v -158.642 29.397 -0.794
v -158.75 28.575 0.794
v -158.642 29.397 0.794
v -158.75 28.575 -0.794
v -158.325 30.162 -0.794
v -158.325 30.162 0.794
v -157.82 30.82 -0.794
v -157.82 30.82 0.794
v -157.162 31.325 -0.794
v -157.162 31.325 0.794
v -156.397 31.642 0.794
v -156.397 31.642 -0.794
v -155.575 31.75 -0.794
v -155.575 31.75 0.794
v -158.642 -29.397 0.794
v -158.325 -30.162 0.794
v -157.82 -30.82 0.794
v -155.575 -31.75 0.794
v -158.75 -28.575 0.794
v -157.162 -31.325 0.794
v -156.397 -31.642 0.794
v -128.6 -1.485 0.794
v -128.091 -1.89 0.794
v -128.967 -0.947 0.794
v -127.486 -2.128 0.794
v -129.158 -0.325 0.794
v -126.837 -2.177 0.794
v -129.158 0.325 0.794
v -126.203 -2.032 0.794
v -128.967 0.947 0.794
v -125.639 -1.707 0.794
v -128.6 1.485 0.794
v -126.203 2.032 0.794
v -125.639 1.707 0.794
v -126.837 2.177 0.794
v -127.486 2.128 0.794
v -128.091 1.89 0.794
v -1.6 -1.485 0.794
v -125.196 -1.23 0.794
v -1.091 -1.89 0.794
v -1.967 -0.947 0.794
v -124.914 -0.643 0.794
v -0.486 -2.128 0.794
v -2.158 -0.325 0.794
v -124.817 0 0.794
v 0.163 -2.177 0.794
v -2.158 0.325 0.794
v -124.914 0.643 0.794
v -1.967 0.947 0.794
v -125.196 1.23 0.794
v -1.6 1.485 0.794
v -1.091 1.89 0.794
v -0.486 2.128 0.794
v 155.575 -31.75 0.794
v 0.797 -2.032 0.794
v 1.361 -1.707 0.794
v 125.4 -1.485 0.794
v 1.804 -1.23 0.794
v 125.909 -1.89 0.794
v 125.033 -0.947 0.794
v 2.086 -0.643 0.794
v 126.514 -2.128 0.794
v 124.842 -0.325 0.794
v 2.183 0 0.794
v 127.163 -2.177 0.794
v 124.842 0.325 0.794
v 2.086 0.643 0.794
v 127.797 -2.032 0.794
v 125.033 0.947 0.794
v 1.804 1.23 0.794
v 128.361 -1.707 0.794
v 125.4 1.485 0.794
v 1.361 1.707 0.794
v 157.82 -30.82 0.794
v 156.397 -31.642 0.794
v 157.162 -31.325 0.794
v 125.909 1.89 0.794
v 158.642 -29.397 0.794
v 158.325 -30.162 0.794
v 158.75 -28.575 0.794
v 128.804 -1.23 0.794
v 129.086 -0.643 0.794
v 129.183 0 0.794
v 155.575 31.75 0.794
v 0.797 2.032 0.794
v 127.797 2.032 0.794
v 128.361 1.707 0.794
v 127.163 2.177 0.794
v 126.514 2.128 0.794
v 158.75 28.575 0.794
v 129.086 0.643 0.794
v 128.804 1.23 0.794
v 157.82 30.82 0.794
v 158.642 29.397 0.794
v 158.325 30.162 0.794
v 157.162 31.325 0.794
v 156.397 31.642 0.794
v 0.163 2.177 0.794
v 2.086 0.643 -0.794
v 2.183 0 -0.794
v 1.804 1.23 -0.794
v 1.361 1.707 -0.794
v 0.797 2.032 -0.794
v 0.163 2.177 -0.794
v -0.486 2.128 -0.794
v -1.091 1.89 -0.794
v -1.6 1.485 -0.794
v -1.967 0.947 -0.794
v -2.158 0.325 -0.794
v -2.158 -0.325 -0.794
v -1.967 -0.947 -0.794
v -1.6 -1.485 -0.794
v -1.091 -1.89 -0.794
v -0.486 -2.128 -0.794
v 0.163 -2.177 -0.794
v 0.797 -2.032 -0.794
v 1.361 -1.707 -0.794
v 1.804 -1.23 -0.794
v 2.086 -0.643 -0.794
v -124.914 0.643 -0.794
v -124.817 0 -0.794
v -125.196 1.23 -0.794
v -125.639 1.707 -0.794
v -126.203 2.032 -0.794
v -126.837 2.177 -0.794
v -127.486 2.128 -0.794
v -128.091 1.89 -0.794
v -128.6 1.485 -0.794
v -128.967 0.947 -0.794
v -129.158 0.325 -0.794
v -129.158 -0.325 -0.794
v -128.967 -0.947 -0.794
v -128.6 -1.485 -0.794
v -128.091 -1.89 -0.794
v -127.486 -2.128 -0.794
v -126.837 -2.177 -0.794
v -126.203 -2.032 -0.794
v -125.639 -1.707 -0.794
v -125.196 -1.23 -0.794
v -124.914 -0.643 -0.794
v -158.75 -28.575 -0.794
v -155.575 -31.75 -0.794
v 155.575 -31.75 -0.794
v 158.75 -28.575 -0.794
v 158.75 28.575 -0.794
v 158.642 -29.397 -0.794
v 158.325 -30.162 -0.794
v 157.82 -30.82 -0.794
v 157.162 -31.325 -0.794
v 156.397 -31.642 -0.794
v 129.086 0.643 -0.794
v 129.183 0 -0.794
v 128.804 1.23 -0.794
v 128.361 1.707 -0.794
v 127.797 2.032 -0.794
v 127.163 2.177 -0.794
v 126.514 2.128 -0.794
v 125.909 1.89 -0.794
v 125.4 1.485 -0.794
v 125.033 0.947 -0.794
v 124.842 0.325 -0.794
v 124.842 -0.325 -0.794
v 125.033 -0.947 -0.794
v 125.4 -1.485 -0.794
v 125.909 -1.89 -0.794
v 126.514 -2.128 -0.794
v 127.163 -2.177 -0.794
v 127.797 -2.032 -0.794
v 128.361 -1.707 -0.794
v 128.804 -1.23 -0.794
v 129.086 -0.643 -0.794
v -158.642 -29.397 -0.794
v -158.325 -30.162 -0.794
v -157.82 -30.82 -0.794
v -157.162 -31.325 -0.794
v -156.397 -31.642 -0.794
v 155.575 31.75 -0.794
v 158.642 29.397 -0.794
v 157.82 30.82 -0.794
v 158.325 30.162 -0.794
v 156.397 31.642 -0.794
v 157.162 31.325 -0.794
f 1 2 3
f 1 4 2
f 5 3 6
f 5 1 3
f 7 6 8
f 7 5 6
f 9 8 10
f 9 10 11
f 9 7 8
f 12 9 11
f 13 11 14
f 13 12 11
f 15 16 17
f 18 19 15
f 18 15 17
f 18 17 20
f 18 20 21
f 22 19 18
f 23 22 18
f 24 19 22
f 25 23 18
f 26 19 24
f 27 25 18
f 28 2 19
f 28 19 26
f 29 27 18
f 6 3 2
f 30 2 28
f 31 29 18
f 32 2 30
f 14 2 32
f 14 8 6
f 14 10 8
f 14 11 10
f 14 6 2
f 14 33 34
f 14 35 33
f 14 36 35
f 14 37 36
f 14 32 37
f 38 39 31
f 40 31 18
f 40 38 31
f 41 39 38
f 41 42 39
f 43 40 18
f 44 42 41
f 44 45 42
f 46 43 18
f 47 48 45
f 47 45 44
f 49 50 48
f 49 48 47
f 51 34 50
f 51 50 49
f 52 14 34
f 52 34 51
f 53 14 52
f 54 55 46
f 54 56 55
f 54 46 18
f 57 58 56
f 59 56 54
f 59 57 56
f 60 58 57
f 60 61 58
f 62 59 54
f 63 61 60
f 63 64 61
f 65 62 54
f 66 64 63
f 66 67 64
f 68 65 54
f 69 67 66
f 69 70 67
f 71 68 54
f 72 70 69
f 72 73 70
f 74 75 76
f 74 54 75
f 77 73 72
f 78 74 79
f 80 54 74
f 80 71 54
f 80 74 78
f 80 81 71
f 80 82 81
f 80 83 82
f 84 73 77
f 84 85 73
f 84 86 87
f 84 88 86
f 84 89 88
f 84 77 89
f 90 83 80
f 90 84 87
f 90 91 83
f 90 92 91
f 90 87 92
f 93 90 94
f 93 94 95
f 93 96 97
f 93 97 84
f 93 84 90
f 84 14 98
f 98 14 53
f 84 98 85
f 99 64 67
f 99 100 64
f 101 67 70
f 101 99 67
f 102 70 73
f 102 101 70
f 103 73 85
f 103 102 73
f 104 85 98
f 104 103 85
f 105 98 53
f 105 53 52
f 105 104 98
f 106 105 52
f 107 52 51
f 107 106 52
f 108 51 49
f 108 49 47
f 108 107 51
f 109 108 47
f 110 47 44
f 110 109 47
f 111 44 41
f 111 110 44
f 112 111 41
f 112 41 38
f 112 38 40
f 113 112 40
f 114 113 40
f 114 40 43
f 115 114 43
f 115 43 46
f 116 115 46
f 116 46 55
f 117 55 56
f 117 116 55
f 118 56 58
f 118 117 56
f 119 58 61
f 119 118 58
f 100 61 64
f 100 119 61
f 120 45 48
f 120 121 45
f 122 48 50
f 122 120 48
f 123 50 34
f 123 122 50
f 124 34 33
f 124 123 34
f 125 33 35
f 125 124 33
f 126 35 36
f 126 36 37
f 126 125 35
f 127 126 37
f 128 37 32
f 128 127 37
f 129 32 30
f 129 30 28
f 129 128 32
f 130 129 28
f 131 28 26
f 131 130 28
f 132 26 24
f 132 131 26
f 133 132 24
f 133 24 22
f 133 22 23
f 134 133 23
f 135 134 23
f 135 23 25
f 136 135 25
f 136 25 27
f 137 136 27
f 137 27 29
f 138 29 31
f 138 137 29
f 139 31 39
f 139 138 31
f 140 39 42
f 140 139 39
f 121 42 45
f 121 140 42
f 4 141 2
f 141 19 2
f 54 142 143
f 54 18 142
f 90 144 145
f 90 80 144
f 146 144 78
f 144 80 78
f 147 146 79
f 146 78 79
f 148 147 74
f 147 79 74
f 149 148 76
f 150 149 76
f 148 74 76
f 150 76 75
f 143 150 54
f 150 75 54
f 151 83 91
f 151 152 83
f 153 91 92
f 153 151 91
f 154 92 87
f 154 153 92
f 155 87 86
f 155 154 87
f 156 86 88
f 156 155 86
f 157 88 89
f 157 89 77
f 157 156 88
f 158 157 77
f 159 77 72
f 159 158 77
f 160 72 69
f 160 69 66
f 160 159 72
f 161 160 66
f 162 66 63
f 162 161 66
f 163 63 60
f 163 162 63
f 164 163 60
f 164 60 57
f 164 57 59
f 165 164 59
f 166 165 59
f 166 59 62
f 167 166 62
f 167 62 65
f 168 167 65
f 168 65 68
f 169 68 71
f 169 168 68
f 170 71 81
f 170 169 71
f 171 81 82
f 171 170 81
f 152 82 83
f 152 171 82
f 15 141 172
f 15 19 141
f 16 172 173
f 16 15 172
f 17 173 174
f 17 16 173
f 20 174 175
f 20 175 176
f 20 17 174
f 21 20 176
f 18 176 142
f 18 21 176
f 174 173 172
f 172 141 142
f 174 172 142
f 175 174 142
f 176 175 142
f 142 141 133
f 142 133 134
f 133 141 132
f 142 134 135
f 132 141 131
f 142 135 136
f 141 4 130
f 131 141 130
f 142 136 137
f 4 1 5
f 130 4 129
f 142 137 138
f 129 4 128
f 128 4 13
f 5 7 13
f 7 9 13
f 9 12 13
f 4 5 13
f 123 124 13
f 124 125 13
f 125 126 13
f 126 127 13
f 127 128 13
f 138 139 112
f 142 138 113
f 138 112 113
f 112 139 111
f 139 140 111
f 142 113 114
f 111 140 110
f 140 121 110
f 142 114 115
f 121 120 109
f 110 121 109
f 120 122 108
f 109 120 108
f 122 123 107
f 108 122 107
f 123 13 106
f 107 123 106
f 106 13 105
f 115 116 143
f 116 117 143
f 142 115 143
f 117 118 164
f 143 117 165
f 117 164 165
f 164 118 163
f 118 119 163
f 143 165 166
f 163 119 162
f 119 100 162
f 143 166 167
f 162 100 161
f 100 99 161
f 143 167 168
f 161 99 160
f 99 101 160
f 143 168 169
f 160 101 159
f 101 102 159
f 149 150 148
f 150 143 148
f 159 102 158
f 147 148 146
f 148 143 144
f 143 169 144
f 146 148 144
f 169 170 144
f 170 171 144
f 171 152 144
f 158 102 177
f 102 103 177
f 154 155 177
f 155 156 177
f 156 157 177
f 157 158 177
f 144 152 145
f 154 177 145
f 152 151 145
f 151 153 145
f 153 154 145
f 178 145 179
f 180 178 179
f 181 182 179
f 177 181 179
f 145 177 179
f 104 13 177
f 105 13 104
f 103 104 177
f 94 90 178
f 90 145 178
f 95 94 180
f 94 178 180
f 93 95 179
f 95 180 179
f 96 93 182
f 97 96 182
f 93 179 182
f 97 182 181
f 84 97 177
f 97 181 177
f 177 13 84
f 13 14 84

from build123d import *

# Parameters (mm, degrees)
SKETCH1_W           = 317.5
SKETCH1_H           = 63.5
SKETCH1_R           = 2.1828125
BOSS_EXTRUDE1_DEPTH = 0.79375
FILLET1_R           = 3.175


with BuildPart() as part:
    # Sketch1 → Boss-Extrude1 (new body, symmetric)
    with BuildSketch(Plane.XY):
        Rectangle(SKETCH1_W, SKETCH1_H)
        Circle(SKETCH1_R, mode=Mode.SUBTRACT)
        with Locations((127, 0)):
            Circle(SKETCH1_R, mode=Mode.SUBTRACT)
        with Locations((-127, 0)):
            Circle(SKETCH1_R, mode=Mode.SUBTRACT)
    extrude(amount=BOSS_EXTRUDE1_DEPTH, both=True)

    # Fillet1
    fillet1_edges = [part.edges().sort_by_distance(p)[0] for p in [
        (158.75, -31.75, 0),
        (-158.75, -31.75, 0),
        (-158.75, 31.75, 0),
        (158.75, 31.75, 0),
    ]]
    fillet(fillet1_edges, radius=FILLET1_R)


solid = part.part
